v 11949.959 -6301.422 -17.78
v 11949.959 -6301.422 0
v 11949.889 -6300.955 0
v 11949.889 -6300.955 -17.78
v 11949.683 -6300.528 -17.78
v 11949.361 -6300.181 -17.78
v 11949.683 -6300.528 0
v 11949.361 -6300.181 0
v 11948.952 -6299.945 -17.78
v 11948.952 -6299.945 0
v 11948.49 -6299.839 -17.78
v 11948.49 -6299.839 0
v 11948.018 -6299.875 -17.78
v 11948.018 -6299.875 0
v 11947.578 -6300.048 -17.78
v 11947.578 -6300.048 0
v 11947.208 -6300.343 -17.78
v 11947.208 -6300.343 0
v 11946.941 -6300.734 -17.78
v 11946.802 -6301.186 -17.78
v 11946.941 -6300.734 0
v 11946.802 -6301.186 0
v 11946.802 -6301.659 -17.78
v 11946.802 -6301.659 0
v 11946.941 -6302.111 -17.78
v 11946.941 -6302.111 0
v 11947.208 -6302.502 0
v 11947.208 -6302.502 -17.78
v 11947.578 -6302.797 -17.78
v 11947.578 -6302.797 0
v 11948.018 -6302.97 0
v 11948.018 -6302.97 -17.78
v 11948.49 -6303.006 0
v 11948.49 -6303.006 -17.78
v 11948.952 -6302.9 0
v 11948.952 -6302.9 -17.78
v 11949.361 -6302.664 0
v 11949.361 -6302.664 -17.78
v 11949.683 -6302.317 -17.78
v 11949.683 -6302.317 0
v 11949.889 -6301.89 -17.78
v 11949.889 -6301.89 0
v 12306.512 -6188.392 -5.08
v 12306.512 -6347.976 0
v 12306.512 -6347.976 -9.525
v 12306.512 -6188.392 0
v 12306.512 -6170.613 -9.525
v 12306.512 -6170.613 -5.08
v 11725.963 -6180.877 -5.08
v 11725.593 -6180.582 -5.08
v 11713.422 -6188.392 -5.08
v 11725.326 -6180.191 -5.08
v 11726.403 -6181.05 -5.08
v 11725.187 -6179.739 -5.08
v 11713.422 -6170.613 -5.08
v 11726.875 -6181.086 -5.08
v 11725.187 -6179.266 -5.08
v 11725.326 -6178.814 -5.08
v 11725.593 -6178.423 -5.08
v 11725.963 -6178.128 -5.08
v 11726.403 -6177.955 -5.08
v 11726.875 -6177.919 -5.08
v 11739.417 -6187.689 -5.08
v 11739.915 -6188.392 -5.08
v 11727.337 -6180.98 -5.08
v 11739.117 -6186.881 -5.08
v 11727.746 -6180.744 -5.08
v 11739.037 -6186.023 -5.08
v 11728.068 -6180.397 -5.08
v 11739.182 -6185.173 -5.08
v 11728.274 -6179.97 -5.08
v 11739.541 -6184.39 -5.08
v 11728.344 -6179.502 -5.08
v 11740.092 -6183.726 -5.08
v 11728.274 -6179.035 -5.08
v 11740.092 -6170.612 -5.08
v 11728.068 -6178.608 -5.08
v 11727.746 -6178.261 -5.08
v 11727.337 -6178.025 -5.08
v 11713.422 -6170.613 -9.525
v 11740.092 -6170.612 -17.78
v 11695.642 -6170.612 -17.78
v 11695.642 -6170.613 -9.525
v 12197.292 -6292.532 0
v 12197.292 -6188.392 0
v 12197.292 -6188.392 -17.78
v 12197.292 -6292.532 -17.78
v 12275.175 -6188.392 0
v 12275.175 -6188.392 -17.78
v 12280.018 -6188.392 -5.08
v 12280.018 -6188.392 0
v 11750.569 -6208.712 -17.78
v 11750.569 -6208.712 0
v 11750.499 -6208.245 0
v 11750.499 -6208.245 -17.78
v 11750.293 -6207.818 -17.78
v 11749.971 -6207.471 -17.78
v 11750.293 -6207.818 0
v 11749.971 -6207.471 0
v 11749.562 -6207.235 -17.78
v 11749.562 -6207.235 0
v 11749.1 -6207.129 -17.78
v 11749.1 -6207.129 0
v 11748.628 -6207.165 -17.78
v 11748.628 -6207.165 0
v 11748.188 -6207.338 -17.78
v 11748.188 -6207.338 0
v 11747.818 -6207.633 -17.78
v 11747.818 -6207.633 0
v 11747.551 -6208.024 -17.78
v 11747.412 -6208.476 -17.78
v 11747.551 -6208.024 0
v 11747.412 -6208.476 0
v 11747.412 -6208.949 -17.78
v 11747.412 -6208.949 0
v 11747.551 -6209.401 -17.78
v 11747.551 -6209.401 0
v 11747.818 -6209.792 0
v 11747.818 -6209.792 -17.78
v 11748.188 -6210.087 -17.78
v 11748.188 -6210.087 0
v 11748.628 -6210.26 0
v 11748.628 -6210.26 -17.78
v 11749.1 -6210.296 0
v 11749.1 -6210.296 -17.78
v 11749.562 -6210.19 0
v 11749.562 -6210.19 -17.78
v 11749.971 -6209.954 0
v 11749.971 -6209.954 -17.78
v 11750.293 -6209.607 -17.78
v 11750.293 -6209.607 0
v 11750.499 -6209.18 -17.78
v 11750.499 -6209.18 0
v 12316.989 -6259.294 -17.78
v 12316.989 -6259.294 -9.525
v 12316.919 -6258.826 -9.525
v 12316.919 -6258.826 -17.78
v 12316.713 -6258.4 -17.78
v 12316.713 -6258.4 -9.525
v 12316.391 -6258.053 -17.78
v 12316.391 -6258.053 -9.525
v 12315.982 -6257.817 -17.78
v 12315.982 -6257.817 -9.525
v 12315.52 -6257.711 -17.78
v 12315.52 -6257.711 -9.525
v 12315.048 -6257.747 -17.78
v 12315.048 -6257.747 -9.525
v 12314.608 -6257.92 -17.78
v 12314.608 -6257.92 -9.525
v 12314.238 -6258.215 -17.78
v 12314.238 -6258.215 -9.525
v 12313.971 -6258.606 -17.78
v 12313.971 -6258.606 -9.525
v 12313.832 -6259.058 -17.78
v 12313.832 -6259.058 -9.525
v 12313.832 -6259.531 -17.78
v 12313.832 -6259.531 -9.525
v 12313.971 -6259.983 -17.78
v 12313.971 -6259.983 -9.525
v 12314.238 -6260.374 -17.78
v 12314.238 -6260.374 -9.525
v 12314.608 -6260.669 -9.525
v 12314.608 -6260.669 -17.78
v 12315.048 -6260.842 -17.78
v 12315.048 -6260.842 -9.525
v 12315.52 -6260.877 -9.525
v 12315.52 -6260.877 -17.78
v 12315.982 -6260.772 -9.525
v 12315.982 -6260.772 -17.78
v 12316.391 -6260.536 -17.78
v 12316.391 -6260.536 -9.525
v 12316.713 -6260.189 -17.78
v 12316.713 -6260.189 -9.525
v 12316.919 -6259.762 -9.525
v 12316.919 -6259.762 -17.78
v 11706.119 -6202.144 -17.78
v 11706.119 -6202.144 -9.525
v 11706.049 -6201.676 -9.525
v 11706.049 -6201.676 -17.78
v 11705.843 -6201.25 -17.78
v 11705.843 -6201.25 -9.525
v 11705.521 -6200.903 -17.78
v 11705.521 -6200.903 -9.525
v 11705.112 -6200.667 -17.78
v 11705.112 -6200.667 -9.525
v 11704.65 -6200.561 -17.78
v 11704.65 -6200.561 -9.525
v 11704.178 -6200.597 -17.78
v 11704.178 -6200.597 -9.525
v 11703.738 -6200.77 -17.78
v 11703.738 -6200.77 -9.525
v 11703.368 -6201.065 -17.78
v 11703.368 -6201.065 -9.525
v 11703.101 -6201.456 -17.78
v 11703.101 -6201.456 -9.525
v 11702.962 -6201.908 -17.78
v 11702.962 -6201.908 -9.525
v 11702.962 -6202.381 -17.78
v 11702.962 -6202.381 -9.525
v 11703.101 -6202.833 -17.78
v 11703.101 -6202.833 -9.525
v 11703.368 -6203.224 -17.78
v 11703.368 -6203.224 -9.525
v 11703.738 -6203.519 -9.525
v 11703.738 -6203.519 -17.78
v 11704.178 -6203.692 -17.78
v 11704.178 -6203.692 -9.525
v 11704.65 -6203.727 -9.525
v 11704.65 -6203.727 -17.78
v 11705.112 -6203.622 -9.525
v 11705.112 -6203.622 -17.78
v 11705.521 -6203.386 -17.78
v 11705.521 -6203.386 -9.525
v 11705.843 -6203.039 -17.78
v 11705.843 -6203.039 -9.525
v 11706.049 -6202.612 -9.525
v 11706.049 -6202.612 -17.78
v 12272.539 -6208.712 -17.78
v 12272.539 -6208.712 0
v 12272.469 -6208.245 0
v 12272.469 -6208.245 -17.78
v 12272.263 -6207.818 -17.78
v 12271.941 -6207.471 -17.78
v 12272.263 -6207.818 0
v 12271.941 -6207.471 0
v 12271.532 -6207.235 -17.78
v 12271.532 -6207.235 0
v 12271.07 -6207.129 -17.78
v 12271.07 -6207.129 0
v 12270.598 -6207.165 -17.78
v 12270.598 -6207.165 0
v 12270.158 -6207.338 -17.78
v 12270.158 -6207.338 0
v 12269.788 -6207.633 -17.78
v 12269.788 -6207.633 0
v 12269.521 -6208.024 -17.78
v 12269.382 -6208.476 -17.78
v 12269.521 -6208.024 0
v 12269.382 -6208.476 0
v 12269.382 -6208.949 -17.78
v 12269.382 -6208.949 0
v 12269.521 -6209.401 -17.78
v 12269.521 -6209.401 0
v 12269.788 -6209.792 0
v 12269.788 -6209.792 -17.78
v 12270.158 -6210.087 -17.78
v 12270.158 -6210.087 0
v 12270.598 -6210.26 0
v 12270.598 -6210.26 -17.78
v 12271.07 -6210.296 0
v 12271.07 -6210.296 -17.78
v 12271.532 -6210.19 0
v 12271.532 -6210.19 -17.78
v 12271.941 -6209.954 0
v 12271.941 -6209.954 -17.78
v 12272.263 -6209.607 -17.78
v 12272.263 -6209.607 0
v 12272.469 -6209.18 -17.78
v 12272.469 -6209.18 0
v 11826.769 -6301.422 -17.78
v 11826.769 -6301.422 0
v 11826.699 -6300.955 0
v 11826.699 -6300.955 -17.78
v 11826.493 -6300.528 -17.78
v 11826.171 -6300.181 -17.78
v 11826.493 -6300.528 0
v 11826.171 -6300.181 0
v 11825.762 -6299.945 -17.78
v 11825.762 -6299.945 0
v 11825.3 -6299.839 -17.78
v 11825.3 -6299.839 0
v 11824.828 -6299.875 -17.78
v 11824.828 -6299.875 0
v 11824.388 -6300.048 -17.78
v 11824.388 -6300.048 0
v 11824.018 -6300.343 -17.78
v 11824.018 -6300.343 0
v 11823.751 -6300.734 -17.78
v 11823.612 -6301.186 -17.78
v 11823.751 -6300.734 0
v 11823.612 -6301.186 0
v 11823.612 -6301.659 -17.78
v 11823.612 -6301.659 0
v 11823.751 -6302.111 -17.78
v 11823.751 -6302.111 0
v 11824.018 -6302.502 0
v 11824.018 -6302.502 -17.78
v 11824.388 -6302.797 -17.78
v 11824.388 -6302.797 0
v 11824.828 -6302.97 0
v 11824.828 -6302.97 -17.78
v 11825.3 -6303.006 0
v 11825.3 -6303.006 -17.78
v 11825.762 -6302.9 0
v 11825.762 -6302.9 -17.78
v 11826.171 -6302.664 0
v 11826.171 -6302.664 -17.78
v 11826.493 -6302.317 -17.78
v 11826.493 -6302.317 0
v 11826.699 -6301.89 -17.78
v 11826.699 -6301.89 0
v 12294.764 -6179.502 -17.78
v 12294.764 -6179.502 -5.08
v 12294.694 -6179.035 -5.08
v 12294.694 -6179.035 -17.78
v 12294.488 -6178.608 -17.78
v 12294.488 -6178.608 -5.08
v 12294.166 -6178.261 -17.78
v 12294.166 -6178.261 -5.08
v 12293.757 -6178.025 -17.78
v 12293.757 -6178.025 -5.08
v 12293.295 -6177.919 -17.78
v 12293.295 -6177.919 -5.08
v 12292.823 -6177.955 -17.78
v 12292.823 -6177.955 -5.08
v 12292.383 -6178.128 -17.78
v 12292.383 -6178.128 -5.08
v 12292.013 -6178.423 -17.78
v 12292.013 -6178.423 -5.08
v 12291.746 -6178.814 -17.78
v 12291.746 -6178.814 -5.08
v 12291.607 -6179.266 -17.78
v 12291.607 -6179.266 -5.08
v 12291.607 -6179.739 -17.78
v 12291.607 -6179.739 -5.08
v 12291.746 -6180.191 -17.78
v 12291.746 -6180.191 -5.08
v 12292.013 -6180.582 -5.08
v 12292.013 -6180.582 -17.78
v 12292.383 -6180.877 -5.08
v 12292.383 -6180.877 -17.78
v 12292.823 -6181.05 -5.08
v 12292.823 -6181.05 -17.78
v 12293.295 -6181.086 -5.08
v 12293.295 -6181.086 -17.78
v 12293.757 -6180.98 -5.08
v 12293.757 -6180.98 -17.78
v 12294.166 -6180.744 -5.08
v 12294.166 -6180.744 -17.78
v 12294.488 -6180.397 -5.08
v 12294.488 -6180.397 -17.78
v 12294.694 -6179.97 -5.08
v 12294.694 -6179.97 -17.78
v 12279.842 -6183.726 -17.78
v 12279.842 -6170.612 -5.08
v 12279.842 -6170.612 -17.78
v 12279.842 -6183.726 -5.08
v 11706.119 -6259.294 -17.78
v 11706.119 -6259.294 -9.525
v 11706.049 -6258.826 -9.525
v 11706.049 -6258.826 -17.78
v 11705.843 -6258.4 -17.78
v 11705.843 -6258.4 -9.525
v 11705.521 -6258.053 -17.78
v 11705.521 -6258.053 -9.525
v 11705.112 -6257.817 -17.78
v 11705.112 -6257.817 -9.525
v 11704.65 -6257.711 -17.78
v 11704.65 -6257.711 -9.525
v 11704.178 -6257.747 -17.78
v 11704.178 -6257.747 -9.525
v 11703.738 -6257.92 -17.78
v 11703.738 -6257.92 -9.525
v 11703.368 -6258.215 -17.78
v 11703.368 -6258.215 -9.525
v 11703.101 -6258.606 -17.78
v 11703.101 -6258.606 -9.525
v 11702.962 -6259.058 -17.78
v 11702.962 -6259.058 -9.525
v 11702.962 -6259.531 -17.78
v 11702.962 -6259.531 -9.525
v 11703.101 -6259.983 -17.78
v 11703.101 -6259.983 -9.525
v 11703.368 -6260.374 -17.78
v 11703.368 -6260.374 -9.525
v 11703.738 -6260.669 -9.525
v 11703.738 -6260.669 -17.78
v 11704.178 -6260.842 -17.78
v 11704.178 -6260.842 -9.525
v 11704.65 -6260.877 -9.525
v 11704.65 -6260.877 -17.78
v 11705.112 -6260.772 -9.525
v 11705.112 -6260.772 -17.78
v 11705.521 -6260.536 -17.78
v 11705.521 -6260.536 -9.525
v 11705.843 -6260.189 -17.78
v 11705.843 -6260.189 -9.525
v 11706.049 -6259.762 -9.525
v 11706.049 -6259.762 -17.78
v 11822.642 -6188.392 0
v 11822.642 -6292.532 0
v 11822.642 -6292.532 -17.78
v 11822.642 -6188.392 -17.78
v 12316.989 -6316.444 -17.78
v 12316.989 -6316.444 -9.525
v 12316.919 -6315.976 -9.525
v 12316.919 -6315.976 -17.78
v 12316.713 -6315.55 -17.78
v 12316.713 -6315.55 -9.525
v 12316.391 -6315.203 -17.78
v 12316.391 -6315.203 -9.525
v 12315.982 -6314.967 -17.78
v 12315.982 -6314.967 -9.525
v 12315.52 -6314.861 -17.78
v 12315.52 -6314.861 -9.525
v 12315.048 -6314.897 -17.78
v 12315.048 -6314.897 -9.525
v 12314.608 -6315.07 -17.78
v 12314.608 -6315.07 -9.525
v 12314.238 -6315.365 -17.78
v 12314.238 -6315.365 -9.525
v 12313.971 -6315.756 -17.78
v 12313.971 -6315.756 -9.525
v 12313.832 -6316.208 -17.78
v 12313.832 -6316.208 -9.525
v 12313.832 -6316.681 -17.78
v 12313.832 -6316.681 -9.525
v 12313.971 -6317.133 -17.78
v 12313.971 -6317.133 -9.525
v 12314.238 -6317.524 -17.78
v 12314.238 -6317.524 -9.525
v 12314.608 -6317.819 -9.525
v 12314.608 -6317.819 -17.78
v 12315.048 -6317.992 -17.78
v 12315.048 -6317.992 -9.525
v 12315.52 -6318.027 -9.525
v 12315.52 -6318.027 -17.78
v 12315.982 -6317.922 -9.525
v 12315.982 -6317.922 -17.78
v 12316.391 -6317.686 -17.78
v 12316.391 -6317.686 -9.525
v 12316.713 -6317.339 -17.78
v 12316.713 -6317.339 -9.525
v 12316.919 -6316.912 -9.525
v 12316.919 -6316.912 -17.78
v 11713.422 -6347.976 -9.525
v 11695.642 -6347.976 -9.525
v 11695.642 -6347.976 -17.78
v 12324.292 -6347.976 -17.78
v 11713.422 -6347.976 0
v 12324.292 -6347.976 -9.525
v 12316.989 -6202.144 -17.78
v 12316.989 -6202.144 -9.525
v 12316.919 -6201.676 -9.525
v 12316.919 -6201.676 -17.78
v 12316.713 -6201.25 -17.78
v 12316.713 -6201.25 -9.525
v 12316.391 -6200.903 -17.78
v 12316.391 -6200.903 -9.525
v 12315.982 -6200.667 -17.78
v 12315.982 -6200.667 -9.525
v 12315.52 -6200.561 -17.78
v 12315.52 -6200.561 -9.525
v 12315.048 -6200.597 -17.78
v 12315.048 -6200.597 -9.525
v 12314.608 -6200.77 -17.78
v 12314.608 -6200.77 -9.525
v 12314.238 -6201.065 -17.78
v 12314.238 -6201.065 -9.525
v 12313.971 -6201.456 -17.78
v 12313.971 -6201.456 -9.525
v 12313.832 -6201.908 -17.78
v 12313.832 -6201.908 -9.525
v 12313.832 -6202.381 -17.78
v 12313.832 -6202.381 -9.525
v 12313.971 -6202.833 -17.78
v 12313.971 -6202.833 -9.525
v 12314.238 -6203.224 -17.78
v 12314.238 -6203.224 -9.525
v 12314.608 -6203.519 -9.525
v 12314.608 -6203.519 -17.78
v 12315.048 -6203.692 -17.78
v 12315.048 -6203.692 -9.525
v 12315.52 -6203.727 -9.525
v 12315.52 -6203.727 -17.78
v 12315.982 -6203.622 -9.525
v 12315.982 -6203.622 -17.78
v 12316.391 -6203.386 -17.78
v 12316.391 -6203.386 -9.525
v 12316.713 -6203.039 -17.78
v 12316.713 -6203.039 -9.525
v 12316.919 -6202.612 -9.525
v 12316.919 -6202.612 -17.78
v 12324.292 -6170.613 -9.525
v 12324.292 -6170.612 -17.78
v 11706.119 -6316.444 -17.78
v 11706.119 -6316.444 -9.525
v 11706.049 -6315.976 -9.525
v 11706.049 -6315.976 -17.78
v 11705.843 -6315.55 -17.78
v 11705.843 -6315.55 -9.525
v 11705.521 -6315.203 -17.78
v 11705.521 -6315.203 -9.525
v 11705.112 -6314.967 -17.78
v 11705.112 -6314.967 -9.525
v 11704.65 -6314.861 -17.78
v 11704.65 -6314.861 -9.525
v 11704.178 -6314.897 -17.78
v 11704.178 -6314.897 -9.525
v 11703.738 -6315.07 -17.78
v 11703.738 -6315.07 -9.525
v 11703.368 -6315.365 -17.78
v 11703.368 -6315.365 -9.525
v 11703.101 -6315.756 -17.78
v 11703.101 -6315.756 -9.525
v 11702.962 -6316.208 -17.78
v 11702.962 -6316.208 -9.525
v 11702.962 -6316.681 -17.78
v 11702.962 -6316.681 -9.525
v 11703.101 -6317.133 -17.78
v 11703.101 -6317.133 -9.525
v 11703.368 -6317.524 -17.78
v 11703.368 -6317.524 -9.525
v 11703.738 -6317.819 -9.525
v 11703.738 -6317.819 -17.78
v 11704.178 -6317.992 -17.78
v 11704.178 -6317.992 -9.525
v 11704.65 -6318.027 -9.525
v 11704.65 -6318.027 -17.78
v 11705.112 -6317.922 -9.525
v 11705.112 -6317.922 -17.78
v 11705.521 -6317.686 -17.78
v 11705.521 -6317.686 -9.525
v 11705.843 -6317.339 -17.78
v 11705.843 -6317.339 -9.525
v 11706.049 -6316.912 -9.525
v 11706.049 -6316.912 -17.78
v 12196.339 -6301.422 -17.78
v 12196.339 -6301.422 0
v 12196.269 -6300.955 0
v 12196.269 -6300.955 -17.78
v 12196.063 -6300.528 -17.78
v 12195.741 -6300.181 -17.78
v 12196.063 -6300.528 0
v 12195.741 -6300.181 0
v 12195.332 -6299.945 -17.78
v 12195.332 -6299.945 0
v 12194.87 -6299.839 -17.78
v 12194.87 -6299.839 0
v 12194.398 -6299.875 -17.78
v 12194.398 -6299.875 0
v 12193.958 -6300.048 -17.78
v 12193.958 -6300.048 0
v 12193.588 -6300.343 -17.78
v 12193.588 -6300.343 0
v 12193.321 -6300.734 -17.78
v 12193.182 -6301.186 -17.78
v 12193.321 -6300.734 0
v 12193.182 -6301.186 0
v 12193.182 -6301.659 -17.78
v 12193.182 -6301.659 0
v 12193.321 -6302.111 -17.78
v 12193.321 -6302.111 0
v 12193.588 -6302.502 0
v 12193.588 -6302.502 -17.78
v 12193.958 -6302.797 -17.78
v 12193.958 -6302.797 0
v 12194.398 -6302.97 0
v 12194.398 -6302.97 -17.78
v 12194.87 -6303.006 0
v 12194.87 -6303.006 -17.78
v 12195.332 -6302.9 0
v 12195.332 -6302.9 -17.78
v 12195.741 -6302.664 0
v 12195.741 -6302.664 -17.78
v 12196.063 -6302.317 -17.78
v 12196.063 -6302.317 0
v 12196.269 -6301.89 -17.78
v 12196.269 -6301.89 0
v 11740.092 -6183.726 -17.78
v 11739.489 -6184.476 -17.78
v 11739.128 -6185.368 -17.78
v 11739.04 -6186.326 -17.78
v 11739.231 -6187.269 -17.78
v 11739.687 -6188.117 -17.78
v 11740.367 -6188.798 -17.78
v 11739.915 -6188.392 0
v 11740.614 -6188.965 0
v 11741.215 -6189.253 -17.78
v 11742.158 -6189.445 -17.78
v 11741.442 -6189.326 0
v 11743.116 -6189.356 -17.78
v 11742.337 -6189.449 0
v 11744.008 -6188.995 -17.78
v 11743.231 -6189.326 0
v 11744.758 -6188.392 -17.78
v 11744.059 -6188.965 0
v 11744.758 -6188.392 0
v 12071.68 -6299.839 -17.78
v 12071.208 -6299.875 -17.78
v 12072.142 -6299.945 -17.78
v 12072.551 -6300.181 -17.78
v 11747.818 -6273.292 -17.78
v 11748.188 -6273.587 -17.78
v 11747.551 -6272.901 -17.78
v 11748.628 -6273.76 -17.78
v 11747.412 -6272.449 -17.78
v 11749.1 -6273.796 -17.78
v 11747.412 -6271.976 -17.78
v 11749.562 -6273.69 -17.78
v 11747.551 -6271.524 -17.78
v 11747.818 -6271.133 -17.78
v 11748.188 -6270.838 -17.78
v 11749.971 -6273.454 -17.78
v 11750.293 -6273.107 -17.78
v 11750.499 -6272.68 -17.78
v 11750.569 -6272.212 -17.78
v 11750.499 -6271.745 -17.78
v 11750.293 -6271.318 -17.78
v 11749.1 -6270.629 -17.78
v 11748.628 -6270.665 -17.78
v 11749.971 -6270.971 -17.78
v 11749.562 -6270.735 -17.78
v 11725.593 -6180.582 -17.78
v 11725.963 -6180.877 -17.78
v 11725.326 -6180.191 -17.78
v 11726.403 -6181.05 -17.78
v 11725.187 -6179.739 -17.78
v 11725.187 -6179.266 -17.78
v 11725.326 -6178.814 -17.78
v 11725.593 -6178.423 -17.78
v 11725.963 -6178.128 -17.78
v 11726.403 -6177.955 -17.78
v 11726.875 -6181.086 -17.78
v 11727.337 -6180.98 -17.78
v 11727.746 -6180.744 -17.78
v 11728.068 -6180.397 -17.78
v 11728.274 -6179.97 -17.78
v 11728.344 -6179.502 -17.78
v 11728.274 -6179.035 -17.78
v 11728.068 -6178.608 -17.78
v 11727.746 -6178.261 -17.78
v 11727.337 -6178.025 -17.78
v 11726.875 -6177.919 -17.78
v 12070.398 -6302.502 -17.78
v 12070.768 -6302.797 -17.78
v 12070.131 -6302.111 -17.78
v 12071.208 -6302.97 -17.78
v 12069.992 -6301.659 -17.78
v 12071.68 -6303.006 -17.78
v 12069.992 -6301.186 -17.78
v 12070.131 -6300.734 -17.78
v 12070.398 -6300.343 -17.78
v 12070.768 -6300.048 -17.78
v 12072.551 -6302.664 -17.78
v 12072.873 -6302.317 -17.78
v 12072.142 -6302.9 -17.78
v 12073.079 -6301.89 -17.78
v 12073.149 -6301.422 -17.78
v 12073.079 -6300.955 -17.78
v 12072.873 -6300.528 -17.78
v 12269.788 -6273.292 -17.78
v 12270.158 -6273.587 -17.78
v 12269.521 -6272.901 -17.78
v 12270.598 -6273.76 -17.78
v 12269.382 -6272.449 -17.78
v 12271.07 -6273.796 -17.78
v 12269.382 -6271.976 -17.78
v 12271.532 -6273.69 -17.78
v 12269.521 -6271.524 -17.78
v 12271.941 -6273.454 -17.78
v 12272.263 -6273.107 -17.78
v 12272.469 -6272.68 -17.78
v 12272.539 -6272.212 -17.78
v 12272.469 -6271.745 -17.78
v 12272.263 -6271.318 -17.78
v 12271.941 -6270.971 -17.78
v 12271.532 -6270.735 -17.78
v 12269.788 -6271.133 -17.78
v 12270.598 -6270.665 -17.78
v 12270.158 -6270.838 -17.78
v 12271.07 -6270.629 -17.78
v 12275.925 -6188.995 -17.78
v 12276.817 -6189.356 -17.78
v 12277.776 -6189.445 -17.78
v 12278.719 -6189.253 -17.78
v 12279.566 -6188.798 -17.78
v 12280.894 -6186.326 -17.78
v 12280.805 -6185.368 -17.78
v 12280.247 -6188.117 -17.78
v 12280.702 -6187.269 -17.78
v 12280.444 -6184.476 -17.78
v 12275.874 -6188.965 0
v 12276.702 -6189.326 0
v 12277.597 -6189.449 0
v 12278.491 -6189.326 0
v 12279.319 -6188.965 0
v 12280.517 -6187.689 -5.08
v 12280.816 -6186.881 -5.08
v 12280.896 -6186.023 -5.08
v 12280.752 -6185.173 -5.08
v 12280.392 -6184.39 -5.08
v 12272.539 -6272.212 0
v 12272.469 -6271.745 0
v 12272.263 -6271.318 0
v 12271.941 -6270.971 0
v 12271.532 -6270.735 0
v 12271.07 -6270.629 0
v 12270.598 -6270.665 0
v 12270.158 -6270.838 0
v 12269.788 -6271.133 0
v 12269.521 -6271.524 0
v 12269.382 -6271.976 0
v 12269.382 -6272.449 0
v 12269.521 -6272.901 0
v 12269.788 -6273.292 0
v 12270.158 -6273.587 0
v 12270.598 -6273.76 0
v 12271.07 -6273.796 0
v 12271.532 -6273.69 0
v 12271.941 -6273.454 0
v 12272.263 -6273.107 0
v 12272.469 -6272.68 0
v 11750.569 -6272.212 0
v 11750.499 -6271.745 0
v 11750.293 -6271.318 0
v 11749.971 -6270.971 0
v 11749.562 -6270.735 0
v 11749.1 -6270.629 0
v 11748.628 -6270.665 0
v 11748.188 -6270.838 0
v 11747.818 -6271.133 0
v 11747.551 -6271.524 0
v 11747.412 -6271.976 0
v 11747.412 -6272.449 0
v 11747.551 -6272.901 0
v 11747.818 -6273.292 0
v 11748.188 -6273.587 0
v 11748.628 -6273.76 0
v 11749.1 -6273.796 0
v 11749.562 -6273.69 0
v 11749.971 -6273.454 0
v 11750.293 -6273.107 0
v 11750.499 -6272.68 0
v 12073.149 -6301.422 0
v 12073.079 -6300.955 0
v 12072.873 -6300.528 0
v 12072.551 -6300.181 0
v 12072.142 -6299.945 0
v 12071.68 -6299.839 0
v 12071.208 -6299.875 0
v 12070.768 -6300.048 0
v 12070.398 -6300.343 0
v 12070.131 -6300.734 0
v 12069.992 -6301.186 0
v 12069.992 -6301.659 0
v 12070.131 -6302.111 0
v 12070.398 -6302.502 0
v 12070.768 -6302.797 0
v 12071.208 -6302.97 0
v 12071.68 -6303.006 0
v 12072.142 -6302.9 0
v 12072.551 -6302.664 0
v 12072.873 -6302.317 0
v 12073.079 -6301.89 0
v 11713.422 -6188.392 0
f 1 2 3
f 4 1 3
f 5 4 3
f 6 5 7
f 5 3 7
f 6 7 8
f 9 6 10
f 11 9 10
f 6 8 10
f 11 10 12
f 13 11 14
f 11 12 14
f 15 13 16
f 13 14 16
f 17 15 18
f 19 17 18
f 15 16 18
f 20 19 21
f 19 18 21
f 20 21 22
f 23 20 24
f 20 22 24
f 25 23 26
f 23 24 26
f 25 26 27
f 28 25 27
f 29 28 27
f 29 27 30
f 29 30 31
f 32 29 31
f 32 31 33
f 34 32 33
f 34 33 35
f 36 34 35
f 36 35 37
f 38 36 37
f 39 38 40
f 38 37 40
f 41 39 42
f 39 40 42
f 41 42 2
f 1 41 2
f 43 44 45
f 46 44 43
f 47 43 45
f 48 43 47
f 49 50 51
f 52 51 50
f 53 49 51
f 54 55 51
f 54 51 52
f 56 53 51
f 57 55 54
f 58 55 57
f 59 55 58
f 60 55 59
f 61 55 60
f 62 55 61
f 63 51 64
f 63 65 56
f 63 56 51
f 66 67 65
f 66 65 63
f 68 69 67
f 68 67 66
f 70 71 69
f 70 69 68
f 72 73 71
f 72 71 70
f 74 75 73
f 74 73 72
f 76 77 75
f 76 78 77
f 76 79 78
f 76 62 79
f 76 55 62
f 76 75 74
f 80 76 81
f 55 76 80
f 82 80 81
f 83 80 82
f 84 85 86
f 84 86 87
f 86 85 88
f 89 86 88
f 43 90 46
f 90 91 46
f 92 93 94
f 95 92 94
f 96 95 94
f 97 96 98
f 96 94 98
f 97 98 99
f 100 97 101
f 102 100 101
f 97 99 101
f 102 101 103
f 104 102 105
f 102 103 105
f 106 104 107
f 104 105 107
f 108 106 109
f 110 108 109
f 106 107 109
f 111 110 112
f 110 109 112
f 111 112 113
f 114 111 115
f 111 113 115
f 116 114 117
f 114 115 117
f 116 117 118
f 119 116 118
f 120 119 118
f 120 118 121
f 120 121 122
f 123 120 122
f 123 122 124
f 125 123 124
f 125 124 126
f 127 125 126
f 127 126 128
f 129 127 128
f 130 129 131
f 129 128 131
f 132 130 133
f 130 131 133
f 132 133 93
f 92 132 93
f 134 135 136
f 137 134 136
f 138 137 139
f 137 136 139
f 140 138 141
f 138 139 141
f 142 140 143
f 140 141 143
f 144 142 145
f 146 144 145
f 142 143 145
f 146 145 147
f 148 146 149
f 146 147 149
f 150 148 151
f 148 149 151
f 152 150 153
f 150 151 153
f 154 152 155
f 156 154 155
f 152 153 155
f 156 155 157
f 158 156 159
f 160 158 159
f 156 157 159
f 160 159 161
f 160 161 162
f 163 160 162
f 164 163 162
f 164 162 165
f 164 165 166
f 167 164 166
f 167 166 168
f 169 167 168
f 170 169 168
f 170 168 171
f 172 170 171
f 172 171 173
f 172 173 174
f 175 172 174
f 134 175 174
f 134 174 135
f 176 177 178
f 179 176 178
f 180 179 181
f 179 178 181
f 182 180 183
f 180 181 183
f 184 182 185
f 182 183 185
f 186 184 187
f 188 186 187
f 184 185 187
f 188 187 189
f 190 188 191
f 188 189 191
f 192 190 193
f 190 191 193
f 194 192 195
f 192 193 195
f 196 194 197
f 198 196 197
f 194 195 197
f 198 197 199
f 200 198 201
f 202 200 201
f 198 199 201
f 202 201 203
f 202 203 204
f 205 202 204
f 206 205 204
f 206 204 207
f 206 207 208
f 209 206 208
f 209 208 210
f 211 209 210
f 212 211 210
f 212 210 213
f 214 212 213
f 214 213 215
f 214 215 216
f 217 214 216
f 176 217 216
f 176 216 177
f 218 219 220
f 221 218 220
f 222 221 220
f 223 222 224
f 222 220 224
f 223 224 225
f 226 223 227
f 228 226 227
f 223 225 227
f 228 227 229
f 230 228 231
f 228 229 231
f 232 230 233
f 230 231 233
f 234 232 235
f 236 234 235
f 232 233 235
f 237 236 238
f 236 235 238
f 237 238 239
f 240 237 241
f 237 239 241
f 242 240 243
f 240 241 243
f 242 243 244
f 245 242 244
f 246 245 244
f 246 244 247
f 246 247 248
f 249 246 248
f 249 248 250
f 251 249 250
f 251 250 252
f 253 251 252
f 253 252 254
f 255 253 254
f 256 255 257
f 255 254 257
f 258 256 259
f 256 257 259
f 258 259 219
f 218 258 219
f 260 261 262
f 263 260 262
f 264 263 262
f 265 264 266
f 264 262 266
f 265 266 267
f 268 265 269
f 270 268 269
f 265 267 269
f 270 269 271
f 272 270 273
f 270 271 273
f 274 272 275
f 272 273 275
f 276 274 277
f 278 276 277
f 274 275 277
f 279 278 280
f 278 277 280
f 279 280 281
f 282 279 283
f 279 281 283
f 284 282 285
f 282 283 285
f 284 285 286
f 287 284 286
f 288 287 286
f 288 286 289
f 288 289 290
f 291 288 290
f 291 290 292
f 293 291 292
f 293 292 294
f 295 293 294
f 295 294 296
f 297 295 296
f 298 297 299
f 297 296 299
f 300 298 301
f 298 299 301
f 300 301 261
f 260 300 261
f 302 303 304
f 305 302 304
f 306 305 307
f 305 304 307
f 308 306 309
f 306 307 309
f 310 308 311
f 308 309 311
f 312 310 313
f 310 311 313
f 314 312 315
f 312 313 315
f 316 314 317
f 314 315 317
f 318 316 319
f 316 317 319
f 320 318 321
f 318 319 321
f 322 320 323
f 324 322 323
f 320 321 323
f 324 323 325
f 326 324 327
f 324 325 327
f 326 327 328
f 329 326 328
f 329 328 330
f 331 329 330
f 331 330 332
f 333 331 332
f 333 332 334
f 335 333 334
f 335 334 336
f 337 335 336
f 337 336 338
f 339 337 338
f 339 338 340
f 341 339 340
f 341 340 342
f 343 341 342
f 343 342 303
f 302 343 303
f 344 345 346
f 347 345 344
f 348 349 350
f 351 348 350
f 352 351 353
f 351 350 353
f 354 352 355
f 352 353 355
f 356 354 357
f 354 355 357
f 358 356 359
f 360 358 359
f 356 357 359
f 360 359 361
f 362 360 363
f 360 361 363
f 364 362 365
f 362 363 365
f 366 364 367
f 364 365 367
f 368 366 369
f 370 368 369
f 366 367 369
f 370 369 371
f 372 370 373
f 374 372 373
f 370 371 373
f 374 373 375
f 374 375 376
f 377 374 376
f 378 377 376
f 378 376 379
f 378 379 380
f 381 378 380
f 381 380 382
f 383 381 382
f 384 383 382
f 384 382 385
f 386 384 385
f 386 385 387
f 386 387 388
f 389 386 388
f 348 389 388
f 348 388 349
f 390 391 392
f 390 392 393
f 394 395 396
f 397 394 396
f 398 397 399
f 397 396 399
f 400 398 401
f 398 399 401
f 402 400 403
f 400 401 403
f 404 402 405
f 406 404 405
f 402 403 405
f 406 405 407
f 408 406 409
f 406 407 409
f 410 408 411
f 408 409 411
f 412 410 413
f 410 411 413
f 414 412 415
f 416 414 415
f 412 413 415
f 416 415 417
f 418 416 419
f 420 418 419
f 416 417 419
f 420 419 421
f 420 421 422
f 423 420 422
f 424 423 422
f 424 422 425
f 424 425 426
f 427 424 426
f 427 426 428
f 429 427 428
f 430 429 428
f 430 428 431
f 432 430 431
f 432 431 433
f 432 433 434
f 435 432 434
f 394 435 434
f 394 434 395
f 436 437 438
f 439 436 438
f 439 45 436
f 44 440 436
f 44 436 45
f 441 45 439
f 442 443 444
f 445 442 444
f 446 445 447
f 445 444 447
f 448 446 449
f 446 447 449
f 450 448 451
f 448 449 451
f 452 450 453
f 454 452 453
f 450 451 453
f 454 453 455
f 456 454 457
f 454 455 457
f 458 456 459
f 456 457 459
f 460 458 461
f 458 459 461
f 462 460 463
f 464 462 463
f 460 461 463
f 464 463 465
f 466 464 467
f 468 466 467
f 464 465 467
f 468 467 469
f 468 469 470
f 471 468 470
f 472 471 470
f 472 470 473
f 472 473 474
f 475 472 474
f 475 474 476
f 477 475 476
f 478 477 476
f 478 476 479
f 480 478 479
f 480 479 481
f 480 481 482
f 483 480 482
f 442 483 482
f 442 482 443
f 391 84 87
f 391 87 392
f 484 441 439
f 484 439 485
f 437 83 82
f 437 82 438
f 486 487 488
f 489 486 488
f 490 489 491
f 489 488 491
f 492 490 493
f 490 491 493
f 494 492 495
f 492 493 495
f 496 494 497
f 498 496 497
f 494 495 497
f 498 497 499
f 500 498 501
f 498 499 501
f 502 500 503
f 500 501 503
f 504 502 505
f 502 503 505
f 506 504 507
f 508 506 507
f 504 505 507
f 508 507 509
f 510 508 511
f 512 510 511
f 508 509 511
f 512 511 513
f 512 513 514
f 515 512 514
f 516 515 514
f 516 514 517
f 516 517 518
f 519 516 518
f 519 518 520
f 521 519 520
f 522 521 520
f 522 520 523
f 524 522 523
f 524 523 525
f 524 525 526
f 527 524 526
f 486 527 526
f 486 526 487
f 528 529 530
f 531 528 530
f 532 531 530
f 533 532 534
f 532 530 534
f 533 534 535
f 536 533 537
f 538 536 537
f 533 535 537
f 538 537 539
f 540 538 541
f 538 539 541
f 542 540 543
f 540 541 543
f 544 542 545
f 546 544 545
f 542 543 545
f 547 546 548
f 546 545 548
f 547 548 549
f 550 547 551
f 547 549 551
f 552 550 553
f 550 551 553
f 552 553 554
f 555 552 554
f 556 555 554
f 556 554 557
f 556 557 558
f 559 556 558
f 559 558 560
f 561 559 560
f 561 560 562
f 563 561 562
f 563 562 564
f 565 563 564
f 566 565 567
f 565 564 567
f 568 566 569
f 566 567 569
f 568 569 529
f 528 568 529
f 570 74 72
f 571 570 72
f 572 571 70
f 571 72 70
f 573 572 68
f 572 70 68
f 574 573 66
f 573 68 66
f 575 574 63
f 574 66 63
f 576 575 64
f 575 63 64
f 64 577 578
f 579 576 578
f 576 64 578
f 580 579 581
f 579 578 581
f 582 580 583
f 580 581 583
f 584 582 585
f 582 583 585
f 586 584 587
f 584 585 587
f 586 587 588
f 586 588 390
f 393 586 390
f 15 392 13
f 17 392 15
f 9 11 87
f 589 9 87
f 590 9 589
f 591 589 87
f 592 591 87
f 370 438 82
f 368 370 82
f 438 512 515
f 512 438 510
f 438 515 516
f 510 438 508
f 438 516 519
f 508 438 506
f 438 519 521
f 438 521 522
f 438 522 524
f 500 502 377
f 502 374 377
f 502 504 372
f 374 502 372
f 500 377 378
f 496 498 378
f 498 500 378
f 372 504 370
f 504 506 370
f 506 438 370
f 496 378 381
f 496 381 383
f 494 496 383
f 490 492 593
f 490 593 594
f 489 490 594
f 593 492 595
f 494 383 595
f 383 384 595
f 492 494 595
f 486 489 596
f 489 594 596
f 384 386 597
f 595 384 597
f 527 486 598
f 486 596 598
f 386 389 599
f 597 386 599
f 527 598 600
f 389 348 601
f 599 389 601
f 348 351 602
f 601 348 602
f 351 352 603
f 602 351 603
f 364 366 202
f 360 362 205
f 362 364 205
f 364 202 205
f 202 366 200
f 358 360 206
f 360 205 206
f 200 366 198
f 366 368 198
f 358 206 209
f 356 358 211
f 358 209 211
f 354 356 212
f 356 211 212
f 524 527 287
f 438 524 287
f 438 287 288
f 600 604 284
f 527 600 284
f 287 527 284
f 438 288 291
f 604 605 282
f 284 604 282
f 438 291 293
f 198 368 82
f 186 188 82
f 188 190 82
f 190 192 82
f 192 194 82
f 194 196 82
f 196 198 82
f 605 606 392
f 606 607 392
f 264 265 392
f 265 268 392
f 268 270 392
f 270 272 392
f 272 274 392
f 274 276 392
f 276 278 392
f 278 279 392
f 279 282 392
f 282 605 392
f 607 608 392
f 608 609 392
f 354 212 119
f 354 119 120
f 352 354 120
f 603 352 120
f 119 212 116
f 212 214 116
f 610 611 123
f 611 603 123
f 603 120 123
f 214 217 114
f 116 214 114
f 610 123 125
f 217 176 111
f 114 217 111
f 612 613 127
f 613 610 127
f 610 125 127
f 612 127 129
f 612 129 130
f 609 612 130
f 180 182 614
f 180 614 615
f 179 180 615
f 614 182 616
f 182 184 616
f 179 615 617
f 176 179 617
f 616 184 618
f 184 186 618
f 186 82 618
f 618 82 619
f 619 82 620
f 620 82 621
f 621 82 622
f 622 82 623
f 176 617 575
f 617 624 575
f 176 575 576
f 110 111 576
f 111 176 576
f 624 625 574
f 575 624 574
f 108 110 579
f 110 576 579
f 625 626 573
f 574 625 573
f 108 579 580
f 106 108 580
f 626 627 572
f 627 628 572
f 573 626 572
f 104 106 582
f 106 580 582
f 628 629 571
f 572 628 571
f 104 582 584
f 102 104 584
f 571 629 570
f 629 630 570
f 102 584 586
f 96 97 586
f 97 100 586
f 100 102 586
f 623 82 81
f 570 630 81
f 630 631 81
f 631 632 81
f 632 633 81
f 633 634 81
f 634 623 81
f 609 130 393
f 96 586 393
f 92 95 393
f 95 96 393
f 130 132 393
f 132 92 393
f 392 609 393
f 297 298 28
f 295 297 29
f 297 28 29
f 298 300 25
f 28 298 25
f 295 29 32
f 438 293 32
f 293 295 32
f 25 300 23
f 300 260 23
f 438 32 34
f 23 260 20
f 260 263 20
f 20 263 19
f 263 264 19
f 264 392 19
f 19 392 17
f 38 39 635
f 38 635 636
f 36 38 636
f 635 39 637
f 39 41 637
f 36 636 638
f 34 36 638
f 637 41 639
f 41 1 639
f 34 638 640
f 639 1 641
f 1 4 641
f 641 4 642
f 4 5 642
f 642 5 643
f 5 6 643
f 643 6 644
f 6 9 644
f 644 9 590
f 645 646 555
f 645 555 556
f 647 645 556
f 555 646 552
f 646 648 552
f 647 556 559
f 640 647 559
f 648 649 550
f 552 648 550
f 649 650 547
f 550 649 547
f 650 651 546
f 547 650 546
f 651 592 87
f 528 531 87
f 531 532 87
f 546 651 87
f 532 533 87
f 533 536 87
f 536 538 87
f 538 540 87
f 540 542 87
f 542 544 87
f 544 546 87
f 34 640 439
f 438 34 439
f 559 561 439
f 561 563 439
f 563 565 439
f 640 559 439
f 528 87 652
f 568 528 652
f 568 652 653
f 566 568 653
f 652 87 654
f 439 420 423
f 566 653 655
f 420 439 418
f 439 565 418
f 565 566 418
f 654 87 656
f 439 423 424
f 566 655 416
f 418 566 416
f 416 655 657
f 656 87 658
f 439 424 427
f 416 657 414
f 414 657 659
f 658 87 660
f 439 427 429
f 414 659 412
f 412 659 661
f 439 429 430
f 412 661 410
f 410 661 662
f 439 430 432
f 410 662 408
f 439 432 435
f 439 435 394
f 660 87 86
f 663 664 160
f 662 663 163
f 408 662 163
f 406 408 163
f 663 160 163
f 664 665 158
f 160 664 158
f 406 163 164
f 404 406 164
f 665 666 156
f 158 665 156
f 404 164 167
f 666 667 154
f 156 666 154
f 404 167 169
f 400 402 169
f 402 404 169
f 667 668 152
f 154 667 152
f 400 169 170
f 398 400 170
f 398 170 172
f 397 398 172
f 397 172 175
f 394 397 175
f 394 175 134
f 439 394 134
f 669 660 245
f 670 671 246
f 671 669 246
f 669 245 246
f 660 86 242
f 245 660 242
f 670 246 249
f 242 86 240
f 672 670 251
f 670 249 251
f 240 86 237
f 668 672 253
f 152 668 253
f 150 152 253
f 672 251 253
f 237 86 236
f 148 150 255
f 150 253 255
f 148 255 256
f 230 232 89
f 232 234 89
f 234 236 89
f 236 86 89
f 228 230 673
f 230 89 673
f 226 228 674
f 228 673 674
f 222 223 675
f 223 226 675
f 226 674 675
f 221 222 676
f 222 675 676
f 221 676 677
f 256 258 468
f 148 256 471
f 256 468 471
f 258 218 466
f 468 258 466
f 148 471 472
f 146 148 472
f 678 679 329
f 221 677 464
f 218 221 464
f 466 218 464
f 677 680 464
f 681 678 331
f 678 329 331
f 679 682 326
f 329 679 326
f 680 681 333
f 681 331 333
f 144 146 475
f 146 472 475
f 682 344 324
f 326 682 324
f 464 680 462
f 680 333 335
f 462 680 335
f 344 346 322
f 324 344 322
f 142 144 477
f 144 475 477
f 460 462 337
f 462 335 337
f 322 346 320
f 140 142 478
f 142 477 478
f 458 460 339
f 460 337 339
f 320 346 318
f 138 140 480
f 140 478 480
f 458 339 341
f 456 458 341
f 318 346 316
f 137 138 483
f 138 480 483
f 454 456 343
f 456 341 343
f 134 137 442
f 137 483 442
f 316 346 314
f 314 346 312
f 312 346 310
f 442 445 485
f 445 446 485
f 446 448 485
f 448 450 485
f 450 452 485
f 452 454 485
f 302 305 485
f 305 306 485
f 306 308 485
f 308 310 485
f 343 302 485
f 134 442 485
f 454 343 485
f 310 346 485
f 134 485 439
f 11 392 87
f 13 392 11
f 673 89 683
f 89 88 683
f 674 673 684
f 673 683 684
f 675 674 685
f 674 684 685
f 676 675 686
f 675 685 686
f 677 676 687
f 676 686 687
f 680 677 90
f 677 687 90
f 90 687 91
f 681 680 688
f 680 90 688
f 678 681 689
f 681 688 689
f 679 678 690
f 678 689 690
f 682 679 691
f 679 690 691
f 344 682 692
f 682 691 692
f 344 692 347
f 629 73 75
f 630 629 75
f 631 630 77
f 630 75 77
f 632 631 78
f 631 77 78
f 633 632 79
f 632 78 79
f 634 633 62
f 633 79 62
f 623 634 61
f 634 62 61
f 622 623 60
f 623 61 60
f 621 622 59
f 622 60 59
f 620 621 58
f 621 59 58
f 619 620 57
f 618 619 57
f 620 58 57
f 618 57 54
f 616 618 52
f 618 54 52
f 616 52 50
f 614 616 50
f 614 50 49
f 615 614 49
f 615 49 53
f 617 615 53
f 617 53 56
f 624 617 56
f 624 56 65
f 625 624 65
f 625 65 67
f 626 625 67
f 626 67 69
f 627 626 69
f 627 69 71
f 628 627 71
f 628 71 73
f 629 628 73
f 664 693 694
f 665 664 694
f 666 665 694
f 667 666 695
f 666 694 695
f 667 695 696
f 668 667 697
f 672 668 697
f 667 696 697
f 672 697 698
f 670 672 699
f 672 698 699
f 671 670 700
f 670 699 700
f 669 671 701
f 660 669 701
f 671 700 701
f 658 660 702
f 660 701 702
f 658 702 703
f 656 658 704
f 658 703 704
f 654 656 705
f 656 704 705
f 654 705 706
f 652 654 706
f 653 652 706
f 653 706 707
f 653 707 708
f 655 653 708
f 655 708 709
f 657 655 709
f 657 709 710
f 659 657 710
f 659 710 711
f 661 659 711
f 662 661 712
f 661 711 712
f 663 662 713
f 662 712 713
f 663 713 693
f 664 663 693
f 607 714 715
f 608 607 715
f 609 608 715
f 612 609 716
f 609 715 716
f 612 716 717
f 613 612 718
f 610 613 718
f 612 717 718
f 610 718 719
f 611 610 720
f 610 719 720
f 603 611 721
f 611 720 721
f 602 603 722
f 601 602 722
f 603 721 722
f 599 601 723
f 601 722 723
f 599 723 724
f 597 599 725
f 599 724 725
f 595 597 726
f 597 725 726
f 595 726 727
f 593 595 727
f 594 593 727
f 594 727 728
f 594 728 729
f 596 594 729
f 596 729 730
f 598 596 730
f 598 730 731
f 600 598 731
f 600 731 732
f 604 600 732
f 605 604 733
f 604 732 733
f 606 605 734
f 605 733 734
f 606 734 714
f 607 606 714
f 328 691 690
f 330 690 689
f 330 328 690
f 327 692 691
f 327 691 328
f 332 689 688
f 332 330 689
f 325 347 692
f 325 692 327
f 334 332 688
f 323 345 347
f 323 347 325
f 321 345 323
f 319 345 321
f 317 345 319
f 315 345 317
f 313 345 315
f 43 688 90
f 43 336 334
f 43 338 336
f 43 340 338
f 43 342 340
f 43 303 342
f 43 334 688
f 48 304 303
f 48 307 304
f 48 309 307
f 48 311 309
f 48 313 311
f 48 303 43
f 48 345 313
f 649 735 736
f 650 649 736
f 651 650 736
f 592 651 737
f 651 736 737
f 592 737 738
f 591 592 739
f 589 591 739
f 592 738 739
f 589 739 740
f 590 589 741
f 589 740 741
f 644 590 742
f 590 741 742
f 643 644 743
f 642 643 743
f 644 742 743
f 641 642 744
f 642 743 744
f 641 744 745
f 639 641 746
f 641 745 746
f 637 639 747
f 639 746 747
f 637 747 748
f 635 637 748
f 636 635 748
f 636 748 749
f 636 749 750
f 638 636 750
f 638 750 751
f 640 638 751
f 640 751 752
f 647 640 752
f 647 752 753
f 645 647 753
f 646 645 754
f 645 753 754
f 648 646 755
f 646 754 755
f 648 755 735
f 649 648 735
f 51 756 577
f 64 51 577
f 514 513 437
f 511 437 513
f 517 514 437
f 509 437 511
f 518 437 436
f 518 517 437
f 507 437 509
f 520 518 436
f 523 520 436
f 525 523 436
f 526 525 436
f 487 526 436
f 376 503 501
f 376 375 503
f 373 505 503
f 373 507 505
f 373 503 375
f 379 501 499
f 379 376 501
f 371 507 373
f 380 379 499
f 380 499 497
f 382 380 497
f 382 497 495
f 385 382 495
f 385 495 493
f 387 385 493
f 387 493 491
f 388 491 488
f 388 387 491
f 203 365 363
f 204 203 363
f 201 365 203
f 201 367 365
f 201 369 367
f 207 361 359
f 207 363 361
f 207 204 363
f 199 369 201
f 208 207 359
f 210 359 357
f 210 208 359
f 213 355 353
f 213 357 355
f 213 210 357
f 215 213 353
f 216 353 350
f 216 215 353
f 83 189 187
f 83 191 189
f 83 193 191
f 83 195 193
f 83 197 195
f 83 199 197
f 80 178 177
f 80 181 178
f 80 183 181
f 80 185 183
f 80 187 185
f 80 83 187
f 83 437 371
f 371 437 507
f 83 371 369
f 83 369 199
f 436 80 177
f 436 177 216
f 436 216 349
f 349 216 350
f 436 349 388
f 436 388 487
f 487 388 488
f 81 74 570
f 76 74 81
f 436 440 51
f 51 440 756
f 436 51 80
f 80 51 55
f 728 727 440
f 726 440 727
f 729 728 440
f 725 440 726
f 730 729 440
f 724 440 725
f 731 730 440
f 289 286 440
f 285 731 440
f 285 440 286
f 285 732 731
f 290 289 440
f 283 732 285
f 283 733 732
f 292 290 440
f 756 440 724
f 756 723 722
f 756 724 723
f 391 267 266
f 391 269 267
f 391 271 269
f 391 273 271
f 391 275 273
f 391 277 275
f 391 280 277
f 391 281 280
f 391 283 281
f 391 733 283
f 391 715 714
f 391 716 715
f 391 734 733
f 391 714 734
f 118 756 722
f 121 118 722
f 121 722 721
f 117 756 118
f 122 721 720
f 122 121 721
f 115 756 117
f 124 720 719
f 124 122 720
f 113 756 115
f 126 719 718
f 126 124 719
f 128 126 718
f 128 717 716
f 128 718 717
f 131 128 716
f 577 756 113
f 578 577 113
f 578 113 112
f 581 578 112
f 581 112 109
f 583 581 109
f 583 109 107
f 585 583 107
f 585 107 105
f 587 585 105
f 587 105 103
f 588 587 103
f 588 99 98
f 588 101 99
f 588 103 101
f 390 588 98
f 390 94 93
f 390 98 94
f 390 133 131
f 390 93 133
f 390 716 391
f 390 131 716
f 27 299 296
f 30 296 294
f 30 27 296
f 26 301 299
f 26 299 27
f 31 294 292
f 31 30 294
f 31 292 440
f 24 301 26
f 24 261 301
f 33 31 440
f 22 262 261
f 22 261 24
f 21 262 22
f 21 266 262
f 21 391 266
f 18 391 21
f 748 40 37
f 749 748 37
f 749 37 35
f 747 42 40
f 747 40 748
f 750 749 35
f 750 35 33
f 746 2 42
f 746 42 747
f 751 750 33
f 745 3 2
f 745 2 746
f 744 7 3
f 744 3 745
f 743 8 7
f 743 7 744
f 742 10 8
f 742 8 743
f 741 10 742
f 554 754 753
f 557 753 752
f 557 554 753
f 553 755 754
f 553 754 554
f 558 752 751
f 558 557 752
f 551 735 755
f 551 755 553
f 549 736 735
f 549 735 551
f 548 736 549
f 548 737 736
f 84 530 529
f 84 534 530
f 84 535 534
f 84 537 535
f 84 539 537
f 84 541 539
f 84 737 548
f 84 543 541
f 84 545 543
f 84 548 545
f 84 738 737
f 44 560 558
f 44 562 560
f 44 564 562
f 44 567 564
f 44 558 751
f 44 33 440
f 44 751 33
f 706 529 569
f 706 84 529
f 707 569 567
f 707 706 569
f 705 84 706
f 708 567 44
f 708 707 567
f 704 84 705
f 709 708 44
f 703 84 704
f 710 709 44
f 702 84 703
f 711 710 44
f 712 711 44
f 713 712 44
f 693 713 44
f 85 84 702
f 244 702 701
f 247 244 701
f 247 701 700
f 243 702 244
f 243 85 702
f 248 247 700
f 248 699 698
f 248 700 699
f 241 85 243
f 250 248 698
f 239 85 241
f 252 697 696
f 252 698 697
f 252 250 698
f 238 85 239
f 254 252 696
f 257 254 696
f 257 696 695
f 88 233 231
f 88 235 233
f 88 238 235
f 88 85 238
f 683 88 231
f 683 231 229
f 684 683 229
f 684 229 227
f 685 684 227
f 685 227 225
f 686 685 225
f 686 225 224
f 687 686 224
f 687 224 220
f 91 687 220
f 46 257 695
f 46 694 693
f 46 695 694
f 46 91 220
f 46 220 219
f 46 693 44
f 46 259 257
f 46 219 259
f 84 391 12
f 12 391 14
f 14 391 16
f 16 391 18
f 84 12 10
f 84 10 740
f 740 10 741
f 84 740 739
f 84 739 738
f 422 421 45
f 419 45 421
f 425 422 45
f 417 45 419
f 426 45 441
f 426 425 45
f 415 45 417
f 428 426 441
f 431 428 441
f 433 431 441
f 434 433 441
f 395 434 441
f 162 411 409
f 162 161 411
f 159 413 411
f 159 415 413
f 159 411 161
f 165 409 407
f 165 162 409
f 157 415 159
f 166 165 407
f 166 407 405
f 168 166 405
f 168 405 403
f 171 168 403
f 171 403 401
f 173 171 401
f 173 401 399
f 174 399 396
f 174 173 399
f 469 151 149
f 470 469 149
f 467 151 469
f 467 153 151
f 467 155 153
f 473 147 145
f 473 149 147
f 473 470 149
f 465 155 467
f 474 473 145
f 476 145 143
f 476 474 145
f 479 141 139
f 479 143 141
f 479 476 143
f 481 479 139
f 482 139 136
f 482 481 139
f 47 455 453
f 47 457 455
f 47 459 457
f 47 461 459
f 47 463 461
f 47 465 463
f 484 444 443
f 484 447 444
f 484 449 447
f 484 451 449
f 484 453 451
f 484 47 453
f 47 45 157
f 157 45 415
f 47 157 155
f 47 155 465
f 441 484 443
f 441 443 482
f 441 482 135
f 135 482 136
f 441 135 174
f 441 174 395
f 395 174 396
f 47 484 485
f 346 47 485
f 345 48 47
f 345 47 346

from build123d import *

# Parameters (mm, degrees)
CABCAPOUTLINE_THICKNESS_DEPTH = 17.78
SKETCH3_W                     = 44.45
SKETCH3_H                     = 17.78
CAPBACKLEDGE_DEPTH_DEPTH      = 5.08
CABSIDELEDGECUTS_W            = 17.78
CABSIDELEDGECUTS_H            = 177.363711221
CABSIDELEDGE_DEPTH_DEPTH      = 9.525
SKETCH5_R                     = 1.5875
SKETCH5_R_2                   = 3.302
CUT_EXTRUDE3_DEPTH            = 17.78


with BuildPart() as part:
    # CabCapOutline → CabCapOutline_Thickness (new body)
    with BuildSketch(Plane.XY):
        Polygon((12324.291666666, -6347.976211221), (12324.291666666, -6170.6125), (12279.841666666, -6170.6125), (12279.841666666, -6188.3925), (12197.291666666, -6188.3925), (12197.291666666, -6292.5325), (11822.641666666, -6292.5325), (11822.641666666, -6188.3925), (11740.091666666, -6188.3925), (11740.091666666, -6170.6125), (11695.641666666, -6170.6125), (11695.641666666, -6347.976211221), align=None)
    extrude(amount=-CABCAPOUTLINE_THICKNESS_DEPTH)

    # Sketch3 → CapBackLedge_Depth (cut)
    with BuildSketch(Plane.XY):
        with Locations((11717.866666666, -6179.5025)):
            Rectangle(SKETCH3_W, SKETCH3_H)
        with Locations((12302.066666666, -6179.5025)):
            Rectangle(SKETCH3_W, SKETCH3_H)
    extrude(amount=-CAPBACKLEDGE_DEPTH_DEPTH, mode=Mode.SUBTRACT)

    # CabSideLedgeCuts → CabSideLedge_Depth (cut)
    with BuildSketch(Plane.XY):
        with Locations((11704.531666666, -6259.294355611)):
            Rectangle(CABSIDELEDGECUTS_W, CABSIDELEDGECUTS_H)
        with Locations((12315.401666666, -6259.294355611)):
            Rectangle(CABSIDELEDGECUTS_W, CABSIDELEDGECUTS_H)
    extrude(amount=-CABSIDELEDGE_DEPTH_DEPTH, mode=Mode.SUBTRACT)

    # Sketch5 → Cut-Extrude3 (cut)
    with BuildSketch(Plane.XY):
        with Locations((11704.531666666, -6316.444355611)):
            Circle(SKETCH5_R)
        with Locations((11704.531666666, -6259.294355611)):
            Circle(SKETCH5_R)
        with Locations((11704.531666666, -6202.144355611)):
            Circle(SKETCH5_R)
        with Locations((11726.756666666, -6179.5025)):
            Circle(SKETCH5_R)
        with Locations((11748.981666666, -6208.7125)):
            Circle(SKETCH5_R)
        with Locations((11748.981666666, -6272.2125)):
            Circle(SKETCH5_R)
        with Locations((11825.181666666, -6301.4225)):
            Circle(SKETCH5_R)
        with Locations((11948.371666666, -6301.4225)):
            Circle(SKETCH5_R)
        with Locations((12071.561666666, -6301.4225)):
            Circle(SKETCH5_R)
        with Locations((12194.751666666, -6301.4225)):
            Circle(SKETCH5_R)
        with Locations((12315.401666666, -6316.444355611)):
            Circle(SKETCH5_R)
        with Locations((12315.401666666, -6259.294355611)):
            Circle(SKETCH5_R)
        with Locations((12270.951666666, -6272.2125)):
            Circle(SKETCH5_R)
        with Locations((12270.951666666, -6208.7125)):
            Circle(SKETCH5_R)
        with Locations((12315.401666666, -6202.144355611)):
            Circle(SKETCH5_R)
        with Locations((12293.176666666, -6179.5025)):
            Circle(SKETCH5_R)
        with Locations((11742.336730696, -6186.14743597)):
            Circle(SKETCH5_R_2)
        with Locations((12277.596602636, -6186.14743597)):
            Circle(SKETCH5_R_2)
    extrude(amount=-CUT_EXTRUDE3_DEPTH, mode=Mode.SUBTRACT)


solid = part.part
